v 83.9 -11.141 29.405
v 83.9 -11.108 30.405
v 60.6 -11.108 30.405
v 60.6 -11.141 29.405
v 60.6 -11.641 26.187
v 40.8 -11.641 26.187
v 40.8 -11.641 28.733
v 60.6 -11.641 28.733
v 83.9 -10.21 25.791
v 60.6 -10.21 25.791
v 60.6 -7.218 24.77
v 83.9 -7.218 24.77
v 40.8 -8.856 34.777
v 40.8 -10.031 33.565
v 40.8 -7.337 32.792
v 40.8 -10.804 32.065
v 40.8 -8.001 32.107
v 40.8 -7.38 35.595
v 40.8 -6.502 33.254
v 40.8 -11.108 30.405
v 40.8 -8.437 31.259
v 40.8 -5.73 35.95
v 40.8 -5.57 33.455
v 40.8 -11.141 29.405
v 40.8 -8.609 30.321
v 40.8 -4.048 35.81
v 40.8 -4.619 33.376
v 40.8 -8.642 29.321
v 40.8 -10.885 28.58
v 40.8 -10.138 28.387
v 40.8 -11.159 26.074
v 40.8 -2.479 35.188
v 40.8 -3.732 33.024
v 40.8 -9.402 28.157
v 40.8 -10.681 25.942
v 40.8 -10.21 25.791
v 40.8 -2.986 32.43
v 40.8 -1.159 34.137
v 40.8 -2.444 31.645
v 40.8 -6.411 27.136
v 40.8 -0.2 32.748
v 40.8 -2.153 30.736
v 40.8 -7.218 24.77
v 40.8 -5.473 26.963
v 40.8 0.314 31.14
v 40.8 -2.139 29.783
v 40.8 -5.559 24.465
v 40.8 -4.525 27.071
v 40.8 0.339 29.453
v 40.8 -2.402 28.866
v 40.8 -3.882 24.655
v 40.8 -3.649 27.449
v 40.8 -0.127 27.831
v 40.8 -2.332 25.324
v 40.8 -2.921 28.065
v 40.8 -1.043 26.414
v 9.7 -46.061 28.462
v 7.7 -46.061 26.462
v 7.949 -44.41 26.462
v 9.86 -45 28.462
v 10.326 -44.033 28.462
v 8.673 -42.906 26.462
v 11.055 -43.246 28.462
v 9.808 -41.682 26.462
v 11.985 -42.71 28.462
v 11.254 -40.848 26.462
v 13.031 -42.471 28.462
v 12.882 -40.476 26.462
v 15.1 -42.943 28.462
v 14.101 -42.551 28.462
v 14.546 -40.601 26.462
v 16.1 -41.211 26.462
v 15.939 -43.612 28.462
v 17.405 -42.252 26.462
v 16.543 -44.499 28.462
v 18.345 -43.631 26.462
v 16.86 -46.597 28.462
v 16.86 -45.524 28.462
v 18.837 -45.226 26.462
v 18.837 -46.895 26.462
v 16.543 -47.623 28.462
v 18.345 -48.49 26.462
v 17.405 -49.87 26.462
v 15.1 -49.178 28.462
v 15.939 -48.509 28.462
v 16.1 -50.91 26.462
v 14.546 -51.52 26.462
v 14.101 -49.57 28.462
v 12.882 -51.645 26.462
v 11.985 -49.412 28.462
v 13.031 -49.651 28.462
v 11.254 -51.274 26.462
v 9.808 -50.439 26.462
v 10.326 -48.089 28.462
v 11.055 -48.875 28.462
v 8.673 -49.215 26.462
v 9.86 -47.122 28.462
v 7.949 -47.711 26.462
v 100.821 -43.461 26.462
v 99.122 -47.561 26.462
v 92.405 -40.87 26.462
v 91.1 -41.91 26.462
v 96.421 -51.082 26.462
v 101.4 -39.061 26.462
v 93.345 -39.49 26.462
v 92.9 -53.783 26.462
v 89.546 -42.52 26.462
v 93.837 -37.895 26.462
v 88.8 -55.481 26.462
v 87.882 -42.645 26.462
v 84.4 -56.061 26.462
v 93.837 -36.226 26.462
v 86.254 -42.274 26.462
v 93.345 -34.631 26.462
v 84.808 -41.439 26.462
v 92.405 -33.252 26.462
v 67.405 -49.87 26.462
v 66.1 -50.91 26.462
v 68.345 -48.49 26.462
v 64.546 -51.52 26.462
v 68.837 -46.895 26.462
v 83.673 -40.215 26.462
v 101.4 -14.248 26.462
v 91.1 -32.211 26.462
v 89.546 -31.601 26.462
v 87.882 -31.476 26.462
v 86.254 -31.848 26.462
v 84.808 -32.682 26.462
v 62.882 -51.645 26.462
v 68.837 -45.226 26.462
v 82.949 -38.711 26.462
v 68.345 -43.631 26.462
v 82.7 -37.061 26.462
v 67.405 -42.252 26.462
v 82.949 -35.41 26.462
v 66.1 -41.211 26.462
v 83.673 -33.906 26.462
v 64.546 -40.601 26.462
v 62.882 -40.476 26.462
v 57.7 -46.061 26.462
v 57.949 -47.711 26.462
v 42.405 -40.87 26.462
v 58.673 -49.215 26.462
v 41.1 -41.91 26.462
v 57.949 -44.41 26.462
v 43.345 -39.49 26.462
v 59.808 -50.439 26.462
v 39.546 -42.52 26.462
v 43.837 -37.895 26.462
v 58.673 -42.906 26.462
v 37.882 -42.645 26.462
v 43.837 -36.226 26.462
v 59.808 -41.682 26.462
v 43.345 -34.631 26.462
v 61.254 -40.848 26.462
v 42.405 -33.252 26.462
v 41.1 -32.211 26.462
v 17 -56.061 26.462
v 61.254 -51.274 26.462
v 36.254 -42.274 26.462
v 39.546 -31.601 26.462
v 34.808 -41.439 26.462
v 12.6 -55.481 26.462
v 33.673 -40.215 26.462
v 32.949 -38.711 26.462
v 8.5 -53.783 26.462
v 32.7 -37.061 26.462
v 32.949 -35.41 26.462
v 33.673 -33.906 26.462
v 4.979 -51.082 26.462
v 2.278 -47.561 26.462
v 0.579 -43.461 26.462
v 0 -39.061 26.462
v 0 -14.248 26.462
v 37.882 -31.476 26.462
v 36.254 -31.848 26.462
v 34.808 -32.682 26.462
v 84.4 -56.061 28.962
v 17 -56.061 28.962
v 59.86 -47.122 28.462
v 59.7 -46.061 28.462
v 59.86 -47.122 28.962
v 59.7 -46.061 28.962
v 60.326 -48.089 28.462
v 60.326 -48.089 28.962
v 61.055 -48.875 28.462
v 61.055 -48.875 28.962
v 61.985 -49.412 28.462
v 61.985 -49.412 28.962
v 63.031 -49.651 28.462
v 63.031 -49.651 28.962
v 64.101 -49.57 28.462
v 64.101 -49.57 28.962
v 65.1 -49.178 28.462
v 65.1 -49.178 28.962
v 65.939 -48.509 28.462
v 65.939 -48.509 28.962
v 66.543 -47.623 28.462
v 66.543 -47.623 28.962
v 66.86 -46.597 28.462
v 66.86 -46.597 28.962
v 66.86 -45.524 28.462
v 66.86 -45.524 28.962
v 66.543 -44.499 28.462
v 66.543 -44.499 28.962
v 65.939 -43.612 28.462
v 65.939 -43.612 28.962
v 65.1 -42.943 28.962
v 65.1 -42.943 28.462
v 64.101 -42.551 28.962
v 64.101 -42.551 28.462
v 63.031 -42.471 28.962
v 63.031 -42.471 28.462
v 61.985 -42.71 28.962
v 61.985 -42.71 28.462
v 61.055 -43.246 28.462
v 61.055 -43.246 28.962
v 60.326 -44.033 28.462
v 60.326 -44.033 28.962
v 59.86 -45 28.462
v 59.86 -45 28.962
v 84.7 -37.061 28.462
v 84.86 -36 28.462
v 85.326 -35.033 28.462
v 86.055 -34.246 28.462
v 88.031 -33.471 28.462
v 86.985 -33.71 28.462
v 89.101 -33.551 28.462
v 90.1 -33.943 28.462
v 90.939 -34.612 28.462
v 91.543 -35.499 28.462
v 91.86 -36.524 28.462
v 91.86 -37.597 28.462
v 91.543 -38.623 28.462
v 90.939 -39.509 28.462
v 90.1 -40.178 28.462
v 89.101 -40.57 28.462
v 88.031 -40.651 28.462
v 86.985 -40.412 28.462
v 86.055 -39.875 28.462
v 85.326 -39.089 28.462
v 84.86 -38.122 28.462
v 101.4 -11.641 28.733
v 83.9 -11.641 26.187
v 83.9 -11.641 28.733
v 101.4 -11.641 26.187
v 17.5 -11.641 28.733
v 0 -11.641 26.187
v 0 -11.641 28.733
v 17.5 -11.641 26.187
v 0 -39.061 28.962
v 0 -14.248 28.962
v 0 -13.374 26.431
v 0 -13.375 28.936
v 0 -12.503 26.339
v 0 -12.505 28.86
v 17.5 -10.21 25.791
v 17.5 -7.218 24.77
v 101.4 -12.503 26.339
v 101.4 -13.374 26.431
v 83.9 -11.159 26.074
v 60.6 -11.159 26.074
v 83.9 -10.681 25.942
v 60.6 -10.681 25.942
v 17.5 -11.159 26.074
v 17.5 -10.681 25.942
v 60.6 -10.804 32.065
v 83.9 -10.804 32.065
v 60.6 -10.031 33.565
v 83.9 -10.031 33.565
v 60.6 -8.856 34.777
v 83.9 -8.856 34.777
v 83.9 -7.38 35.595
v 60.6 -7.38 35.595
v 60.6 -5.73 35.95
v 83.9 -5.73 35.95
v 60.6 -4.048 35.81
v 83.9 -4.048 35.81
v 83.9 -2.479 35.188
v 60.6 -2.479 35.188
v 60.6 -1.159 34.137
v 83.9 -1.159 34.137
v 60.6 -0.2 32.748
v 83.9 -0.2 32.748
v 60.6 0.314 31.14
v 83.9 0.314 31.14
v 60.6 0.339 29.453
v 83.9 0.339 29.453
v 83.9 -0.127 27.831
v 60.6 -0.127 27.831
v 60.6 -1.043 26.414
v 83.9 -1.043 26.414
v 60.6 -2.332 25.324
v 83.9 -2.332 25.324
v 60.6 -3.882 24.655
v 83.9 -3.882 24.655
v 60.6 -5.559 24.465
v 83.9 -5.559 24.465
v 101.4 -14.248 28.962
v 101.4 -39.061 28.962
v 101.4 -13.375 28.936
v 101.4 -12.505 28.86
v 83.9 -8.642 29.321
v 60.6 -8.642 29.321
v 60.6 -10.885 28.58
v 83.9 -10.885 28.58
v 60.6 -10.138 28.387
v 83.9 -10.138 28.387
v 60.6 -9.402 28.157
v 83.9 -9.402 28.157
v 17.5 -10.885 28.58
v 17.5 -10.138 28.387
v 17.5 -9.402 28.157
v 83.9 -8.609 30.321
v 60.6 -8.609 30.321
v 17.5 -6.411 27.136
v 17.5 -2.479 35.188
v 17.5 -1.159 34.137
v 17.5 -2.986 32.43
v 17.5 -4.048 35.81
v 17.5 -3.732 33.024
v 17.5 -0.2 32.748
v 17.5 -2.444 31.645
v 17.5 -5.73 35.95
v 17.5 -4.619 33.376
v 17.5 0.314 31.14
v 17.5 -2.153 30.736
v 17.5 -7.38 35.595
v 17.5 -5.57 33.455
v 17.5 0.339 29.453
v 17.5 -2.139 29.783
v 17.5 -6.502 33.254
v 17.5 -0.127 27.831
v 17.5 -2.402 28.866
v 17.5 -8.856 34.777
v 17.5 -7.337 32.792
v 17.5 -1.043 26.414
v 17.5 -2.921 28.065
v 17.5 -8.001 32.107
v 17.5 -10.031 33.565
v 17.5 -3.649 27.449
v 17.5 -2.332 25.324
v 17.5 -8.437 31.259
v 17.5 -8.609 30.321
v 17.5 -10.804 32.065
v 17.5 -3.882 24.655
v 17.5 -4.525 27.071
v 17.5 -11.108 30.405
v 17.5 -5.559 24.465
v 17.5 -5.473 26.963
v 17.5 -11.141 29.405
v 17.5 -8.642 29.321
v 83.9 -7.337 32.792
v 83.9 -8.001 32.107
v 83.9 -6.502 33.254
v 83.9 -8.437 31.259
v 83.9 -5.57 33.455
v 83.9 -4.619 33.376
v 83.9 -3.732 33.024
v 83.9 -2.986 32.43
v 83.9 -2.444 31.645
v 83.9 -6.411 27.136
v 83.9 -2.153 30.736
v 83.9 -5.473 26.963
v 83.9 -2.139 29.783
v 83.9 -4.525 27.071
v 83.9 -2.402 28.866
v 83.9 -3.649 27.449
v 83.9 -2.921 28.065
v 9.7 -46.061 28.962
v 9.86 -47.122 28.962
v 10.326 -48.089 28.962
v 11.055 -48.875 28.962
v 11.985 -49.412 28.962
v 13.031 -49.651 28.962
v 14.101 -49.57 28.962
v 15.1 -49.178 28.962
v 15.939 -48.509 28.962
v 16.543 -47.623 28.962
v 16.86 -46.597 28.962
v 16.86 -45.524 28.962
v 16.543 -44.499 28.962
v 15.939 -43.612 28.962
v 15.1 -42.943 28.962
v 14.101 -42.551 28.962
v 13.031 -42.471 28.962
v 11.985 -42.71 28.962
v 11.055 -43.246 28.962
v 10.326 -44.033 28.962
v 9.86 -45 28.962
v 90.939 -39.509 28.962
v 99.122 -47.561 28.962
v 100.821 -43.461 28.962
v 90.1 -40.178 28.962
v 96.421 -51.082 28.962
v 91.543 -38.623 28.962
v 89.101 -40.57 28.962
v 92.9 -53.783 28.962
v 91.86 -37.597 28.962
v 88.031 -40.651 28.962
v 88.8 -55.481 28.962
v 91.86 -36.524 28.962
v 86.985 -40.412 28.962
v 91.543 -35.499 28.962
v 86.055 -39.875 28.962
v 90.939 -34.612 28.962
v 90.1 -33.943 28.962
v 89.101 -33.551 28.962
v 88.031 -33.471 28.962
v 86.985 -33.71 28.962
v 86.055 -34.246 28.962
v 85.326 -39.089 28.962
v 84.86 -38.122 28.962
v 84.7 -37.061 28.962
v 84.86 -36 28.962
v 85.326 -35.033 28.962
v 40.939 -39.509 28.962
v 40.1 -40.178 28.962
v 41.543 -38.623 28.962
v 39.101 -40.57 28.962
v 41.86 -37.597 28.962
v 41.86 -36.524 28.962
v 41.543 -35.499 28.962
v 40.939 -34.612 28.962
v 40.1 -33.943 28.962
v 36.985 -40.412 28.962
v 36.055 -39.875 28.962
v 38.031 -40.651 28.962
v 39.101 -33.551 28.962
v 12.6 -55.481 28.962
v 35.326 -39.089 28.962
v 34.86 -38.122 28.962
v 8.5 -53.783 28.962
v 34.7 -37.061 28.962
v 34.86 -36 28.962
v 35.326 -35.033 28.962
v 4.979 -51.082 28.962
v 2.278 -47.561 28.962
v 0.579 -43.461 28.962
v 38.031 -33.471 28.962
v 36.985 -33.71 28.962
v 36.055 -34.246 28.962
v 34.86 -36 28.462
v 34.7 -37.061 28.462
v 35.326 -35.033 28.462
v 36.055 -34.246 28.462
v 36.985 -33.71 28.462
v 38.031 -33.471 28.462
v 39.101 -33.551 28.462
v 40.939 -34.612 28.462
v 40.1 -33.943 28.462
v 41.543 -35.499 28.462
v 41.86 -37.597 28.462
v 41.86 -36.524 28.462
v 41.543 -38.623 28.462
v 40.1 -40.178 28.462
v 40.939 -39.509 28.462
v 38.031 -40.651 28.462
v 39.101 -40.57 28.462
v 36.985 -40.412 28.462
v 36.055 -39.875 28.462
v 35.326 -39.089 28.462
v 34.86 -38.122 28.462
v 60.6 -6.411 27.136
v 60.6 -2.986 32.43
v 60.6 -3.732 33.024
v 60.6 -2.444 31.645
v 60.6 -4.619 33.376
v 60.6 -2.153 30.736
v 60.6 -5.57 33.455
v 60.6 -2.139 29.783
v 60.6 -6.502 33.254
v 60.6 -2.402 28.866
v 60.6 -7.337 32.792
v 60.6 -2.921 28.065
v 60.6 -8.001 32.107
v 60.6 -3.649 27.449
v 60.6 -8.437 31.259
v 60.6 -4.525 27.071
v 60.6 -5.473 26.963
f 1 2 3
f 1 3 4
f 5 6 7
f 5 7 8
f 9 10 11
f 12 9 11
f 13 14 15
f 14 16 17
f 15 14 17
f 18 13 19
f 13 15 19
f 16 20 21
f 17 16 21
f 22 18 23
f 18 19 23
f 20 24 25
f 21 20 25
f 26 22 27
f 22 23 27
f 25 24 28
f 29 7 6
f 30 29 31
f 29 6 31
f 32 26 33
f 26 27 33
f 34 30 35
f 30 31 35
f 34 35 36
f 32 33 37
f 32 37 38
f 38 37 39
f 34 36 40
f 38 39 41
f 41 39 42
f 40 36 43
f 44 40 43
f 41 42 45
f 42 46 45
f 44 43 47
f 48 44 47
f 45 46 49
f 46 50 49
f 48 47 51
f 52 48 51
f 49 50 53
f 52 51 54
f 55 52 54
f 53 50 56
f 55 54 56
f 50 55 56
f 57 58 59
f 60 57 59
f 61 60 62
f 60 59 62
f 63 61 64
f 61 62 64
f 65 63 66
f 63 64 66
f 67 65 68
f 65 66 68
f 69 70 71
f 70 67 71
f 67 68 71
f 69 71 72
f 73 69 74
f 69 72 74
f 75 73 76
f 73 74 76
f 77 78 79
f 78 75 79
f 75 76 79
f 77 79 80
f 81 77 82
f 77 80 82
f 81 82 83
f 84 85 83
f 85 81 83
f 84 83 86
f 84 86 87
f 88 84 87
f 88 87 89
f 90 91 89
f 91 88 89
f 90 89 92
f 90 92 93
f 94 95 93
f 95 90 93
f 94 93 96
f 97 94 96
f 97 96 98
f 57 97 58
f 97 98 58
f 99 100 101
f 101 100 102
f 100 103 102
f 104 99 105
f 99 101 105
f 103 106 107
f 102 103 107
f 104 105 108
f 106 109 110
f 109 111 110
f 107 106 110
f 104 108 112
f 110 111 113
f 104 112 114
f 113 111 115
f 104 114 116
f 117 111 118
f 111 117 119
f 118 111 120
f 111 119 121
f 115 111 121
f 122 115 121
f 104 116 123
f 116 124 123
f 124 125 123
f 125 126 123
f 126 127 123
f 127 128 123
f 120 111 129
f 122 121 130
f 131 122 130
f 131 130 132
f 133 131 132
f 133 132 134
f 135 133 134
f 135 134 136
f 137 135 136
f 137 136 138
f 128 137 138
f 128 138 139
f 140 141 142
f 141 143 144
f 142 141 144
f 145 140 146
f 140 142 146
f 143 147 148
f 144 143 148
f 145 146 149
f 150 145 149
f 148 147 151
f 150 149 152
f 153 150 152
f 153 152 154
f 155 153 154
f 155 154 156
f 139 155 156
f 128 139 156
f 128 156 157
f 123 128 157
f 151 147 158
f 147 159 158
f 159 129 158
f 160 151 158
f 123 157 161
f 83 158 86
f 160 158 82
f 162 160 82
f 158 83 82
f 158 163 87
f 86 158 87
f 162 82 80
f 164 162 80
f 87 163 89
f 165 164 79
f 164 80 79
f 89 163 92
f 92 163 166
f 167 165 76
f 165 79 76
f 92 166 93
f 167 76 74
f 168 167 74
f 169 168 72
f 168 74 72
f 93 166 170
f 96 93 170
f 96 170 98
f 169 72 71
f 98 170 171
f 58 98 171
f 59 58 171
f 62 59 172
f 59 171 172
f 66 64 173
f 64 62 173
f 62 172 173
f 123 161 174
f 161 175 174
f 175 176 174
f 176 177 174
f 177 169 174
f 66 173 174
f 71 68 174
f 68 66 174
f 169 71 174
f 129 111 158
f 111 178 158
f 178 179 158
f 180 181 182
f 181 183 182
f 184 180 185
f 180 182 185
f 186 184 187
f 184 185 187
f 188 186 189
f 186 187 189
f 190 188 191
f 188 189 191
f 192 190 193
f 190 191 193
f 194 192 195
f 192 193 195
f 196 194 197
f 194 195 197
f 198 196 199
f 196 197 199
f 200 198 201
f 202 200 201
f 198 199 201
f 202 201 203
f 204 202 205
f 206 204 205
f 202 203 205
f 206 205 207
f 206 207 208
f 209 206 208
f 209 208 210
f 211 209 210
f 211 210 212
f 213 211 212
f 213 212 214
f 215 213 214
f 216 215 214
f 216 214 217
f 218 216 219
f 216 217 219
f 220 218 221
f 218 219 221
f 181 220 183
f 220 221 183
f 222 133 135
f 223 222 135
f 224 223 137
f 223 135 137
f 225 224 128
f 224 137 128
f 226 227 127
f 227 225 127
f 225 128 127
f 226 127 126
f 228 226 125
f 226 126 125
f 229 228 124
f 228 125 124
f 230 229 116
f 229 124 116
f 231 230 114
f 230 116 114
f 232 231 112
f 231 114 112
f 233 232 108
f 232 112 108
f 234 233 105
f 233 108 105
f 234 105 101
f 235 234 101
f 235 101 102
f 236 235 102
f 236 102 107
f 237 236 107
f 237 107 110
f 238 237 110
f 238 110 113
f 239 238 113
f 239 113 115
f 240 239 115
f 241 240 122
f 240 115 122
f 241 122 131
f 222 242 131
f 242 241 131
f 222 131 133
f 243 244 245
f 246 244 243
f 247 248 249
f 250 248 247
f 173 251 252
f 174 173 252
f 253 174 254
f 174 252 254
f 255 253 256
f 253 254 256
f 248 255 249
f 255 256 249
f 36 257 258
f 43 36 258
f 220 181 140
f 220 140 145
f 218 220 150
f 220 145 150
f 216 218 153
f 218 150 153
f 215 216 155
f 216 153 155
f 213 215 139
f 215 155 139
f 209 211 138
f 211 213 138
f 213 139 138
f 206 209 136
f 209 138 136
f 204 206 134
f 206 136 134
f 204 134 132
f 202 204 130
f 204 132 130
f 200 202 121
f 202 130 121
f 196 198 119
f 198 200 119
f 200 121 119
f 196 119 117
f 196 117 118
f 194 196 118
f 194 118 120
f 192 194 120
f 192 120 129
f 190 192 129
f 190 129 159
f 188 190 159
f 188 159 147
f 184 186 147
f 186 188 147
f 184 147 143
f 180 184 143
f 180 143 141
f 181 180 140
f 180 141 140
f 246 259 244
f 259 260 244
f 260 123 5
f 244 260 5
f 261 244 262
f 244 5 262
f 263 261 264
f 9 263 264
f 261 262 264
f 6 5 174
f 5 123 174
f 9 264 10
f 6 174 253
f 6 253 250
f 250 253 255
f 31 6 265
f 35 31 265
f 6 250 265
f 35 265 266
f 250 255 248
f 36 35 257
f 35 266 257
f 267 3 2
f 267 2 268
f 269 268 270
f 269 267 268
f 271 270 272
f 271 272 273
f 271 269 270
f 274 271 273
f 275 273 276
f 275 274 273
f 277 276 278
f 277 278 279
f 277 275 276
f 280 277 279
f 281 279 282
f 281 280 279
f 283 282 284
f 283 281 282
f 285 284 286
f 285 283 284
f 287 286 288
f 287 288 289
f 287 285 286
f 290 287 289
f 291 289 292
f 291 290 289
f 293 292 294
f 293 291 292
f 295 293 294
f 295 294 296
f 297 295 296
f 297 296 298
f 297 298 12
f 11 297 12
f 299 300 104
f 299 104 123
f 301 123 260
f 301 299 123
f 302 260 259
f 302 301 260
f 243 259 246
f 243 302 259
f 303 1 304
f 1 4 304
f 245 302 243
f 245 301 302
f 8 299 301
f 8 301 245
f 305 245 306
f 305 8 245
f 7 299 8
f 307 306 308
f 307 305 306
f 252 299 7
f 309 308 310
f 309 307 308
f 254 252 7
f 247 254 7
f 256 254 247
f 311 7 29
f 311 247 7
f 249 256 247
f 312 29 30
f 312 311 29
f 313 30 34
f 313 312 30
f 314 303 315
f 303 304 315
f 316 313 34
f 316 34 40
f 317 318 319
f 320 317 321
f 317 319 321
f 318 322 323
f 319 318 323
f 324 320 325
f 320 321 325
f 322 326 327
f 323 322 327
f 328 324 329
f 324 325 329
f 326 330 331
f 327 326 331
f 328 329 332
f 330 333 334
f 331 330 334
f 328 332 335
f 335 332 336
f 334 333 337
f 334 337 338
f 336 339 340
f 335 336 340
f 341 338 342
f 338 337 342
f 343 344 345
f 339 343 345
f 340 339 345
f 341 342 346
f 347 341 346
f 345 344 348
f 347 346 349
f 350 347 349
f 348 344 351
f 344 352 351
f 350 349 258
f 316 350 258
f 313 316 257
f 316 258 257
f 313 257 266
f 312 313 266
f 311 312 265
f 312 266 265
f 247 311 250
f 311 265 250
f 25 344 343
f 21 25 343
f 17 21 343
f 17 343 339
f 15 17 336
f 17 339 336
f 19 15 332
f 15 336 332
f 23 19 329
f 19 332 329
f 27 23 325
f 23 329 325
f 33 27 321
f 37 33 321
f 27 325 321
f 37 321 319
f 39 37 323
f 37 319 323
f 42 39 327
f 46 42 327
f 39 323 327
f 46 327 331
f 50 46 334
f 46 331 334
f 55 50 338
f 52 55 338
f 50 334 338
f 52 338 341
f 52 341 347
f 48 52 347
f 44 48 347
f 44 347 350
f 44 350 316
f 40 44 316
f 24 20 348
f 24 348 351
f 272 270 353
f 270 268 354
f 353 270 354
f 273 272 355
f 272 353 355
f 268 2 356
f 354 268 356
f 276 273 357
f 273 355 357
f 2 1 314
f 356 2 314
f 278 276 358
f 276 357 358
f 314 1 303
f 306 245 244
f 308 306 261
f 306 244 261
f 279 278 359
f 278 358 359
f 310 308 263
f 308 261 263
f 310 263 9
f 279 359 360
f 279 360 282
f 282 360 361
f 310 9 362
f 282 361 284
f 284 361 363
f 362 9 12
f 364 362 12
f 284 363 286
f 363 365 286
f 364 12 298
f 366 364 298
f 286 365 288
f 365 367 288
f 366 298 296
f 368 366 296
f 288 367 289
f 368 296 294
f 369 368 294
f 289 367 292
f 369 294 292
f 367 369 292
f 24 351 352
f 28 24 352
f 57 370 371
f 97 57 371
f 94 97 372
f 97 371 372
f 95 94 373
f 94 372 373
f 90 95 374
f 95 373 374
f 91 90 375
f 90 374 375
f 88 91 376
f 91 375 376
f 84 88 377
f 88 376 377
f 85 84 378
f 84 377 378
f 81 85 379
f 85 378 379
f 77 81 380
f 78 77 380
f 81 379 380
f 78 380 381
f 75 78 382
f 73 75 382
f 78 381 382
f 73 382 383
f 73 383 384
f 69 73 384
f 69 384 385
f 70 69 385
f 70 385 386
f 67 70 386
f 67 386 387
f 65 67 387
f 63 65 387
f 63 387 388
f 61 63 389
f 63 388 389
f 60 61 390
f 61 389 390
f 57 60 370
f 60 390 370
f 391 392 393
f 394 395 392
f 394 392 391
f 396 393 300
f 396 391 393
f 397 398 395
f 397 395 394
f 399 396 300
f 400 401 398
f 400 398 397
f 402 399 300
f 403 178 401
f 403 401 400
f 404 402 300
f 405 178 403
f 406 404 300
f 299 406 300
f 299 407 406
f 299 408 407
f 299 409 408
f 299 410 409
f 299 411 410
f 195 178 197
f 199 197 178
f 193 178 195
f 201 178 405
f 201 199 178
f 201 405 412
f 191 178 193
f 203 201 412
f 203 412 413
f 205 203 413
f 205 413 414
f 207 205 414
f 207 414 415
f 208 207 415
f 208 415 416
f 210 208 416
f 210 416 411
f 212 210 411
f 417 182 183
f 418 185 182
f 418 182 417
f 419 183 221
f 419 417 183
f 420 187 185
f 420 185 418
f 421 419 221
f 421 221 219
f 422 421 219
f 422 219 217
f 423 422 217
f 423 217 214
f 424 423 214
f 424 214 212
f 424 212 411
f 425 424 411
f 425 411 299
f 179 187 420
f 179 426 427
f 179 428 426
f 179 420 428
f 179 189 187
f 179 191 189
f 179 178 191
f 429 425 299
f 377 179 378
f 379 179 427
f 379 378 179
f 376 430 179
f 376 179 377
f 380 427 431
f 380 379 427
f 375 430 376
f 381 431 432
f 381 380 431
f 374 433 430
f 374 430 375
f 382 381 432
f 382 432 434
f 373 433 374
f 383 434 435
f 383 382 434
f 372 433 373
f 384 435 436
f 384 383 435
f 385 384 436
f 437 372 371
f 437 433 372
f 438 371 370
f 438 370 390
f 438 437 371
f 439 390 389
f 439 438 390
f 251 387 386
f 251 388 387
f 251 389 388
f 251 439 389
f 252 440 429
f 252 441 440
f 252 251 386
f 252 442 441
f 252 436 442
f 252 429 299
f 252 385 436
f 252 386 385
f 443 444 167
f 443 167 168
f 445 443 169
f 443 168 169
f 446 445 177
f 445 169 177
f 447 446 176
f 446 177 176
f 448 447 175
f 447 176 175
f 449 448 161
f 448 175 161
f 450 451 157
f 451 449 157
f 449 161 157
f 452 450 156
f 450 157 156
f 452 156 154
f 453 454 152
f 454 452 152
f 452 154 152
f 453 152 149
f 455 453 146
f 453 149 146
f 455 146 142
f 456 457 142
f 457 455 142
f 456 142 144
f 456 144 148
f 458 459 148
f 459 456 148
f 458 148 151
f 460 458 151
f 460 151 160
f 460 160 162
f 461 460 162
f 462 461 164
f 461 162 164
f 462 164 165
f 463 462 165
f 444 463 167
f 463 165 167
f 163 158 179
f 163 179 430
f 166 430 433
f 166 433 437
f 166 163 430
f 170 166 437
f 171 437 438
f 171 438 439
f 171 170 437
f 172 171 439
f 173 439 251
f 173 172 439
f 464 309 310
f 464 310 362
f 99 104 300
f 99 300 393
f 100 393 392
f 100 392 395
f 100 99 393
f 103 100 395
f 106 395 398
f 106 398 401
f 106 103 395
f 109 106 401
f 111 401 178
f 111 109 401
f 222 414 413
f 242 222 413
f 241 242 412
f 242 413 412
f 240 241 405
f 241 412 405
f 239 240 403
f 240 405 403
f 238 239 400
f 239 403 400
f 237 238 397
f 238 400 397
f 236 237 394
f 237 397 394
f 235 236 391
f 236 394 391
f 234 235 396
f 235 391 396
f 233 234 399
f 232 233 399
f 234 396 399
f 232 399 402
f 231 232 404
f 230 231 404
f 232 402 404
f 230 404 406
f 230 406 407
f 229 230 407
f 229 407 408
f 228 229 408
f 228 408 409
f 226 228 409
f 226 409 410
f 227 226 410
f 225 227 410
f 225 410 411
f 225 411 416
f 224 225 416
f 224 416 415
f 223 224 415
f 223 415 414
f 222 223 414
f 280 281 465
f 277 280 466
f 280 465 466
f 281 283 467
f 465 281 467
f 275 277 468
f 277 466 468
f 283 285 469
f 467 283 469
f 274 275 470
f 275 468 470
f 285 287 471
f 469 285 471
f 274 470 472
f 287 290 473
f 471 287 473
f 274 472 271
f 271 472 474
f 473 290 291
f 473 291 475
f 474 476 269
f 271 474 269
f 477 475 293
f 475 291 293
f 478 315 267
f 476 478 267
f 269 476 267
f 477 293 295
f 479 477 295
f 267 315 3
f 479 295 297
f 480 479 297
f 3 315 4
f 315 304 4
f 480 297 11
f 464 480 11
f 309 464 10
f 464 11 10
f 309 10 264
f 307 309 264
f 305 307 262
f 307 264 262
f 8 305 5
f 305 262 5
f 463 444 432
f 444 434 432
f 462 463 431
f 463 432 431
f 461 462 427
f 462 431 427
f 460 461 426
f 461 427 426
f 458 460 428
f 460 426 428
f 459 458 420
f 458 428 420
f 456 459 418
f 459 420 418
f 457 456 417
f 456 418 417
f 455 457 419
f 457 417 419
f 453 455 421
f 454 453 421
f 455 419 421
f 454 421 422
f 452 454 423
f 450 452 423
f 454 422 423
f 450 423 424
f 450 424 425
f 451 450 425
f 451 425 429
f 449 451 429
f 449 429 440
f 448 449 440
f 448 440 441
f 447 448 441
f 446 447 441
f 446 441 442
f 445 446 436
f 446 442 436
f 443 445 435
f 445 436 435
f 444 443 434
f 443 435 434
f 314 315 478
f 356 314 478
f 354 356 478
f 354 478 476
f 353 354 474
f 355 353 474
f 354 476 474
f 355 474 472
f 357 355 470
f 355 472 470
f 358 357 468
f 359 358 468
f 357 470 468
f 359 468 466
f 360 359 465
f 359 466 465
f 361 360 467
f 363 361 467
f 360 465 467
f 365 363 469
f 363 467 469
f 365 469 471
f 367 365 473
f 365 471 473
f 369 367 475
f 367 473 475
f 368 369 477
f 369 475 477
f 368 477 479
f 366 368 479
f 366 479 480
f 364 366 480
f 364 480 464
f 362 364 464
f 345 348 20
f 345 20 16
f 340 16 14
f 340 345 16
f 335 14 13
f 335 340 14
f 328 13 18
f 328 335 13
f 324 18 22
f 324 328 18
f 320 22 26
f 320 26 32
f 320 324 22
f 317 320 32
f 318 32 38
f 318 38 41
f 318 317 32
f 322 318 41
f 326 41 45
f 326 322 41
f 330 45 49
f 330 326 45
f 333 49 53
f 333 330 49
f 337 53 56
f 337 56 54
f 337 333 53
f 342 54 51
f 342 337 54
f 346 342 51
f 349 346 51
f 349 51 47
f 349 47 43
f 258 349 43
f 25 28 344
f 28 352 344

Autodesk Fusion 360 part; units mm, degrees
sketch "Sketch2" plane through (0, 0, 0) normal (1, 0, 0) x (0, 1, 0)
  line L0 (-56.0607, 28.9615) -> (-14.2484, 28.9615)
  line L1 (-9.4019, 28.157) -> (-6.4108, 27.1358)
  arc A0 (-6.4108, 27.1358) -> (-8.6089, 30.3207) centre (-5.3607, 30.2115) ccw
  circle A1 centre (-5.3607, 30.2115) radius 2.75
  line L2 (-56.0607, 26.4615) -> (-14.2484, 26.4615)
  line L3 (-10.2097, 25.791) -> (-7.2185, 24.7698)
  arc A2 (-7.2185, 24.7698) -> (-11.1075, 30.4047) centre (-5.3607, 30.2115) ccw
  line L4 (-56.0607, 28.9615) -> (-56.0607, 26.4615)
  line L5 (-11.1075, 30.4047) -> (-11.1411, 29.4053)
  line L6 (-11.1411, 29.4053) -> (-8.6425, 29.3212)
  line L7 (-8.6425, 29.3212) -> (-8.6089, 30.3207)
  arc A3 (-9.4019, 28.157) -> (-14.2484, 28.9615) centre (-14.2484, 13.9615) ccw
  arc A4 (-10.2097, 25.791) -> (-14.2484, 26.4615) centre (-14.2484, 13.9615) ccw
  line L8 (14.6393, 52.3652) -> (14.6393, 9.6795) construction
  arc A5 (40.386, 30.4047) -> (36.497, 24.7698) centre (34.6393, 30.2115) ccw
  circle A6 centre (34.6393, 30.2115) radius 2.75
  line L9 (85.3393, 28.9615) -> (43.5269, 28.9615)
  line L10 (85.3393, 28.9615) -> (85.3393, 26.4615)
  arc A7 (43.5269, 28.9615) -> (38.6804, 28.157) centre (43.5269, 13.9615) ccw
  line L11 (40.386, 30.4047) -> (40.4196, 29.4053)
  arc A8 (37.8874, 30.3207) -> (35.6893, 27.1358) centre (34.6393, 30.2115) ccw
  line L12 (38.6804, 28.157) -> (35.6893, 27.1358)
  line L13 (40.4196, 29.4053) -> (37.921, 29.3212)
  line L14 (39.4882, 25.791) -> (36.497, 24.7698)
  line L15 (85.3393, 26.4615) -> (43.5269, 26.4615)
  arc A9 (43.5269, 26.4615) -> (39.4882, 25.791) centre (43.5269, 13.9615) ccw
  line L16 (37.921, 29.3212) -> (37.8874, 30.3207)
  dimension "d1" = 5.5
  dimension "d2" = 50.7
  dimension "d3" = 2.5
  dimension "d4" = 0
  dimension "d5" = 0.5
  dimension "d6" = 0
  dimension "d7" = 1
  dimension "d8" = 15
  dimension "d9" = 20
extrude "Extrude1" add sketch "Sketch2" along normal blind 101.4 contours L0 L1 A0 L2 L3 A2 L4 L5 L6 L7 A3 A4
sketch "Sketch1" plane through (0, 0, 28.9615) normal (0, 0, 1) x (-1, 0, 0)
  line L0 (0, 14.2484) -> (0, 56.0607)
  line L1 (0, 56.0607) -> (-101.4, 56.0607)
  line L2 (-101.4, 56.0607) -> (-101.4, 14.2484)
  line L3 (-101.4, 14.2484) -> (0, 14.2484)
  line L4 (0, 14.2484) -> (18.3824, 20.4527)
  line L5 (18.3824, 20.4527) -> (18.3824, -4.9808)
  line L6 (18.3824, -4.9808) -> (-17.5, -4.9808)
  line L7 (-17.5, -4.9808) -> (-17.5, 14.2484)
  line L8 (-40.8, 14.2484) -> (-40.8, 11.0057)
  line L9 (-40.8, 11.0057) -> (-40.8, -4.9808)
  line L10 (-40.8, -4.9808) -> (-60.6, -4.9808)
  line L11 (-60.6, -4.9808) -> (-60.6, 14.2484)
  line L12 (-83.9, 14.2484) -> (-83.9, -4.9808)
  line L13 (-83.9, -4.9808) -> (-134.9138, -4.9808)
  line L14 (-134.9138, -4.9808) -> (-127.3022, 20.8989)
  line L15 (-127.3022, 20.8989) -> (-101.4, 14.2484)
  circle A0 centre (-13.3, 46.0607) radius 3.6
  circle A1 centre (-63.3, 46.0607) radius 3.6
  circle A2 centre (-38.3, 37.0607) radius 3.6
  circle A3 centre (-88.3, 37.0607) radius 3.6
  arc A4 (0, 39.0607) -> (-17, 56.0607) centre (-17, 39.0607) ccw
  arc A5 (-84.4, 56.0607) -> (-101.4, 39.0607) centre (-84.4, 39.0607) ccw
  line L16 (0, 11.1411) -> (0, 8.6425)
  line L17 (-60.6, 11.6411) -> (-61.7689, 11.6411)
  line L18 (0, 11.6411) -> (-83.9, 11.6411)
  arc A6 (0, 11.6411) -> (0, 13.0607) centre (0, 12.3509) ccw
  line L19 (0, 13.0607) -> (0, 14.2484)
  line L20 (-83.9, 11.6411) -> (-104.4263, 11.6411)
  line L21 (-104.4263, 11.6411) -> (-104.4263, 15.0254)
  dimension "d25" = 17.5
  dimension "d26" = 17.5
  dimension "d27" = 23.3
  dimension "d28" = 23.3
  dimension "d37" = 7.2
  dimension "d40" = -25
  dimension "d41" = -9
  dimension "d42" = 13.3
  dimension "d43" = 10
  dimension "d44" = 17
  dimension "d45" = 17
  dimension "d78" = 0.5
extrude "Extrude2" cut sketch "Sketch1" along normal blind 10 and the other way blind 10 contours L4 L5 L6 L7 L18 A6 L19 | L0 L1 A4 | L1 L2 A5 | L8 L9 L10 L11 L18 | L12 L13 L14 L15 L20 L21 | A0 | A1 | A2 | A3
chamfer "Chamfer1" distance 2 angle 45 4 edges at (16.6564, -44.7589, 26.4615) (41.6564, -35.7589, 26.4615) (66.6564, -44.7589, 26.4615) (91.6564, -35.7589, 26.4615)
equation "d26 = d25"
equation "d27 = d28"
equation "d45 = d44"
equation "d2 = ( 101.4 / 2 ) * 1 mm"
equation "d4 = d4 / 2"
equation "d6 = d4"
